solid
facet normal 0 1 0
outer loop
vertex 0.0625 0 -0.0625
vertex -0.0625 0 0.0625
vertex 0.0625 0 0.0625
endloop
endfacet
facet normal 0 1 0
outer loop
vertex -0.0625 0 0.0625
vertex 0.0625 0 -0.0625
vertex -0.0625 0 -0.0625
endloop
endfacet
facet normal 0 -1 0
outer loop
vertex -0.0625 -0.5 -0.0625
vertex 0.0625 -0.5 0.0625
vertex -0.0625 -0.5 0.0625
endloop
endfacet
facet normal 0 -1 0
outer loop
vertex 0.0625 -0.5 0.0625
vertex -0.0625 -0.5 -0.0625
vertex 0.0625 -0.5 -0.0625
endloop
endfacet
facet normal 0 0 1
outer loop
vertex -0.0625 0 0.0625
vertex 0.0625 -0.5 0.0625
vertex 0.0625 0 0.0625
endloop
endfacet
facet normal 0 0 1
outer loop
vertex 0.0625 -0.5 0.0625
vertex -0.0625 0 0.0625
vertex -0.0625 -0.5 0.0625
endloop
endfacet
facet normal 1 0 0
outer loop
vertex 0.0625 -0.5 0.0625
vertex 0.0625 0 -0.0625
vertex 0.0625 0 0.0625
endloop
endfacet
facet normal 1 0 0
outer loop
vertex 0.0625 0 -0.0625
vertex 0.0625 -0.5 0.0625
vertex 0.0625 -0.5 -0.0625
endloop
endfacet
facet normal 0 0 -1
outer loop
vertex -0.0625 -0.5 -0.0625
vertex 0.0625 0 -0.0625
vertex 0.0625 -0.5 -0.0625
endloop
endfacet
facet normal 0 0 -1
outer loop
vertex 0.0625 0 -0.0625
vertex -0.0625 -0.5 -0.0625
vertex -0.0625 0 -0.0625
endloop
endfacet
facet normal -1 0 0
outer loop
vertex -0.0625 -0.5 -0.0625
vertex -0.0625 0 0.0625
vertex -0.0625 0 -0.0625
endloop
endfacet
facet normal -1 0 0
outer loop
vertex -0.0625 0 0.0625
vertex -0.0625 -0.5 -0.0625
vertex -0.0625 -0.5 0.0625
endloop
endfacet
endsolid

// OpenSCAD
rotate(-90, [1, 0, 0]) {
    translate([0, 0, -4/16])
    cube([2/16, 2/16, 8/16], center = true);
}
